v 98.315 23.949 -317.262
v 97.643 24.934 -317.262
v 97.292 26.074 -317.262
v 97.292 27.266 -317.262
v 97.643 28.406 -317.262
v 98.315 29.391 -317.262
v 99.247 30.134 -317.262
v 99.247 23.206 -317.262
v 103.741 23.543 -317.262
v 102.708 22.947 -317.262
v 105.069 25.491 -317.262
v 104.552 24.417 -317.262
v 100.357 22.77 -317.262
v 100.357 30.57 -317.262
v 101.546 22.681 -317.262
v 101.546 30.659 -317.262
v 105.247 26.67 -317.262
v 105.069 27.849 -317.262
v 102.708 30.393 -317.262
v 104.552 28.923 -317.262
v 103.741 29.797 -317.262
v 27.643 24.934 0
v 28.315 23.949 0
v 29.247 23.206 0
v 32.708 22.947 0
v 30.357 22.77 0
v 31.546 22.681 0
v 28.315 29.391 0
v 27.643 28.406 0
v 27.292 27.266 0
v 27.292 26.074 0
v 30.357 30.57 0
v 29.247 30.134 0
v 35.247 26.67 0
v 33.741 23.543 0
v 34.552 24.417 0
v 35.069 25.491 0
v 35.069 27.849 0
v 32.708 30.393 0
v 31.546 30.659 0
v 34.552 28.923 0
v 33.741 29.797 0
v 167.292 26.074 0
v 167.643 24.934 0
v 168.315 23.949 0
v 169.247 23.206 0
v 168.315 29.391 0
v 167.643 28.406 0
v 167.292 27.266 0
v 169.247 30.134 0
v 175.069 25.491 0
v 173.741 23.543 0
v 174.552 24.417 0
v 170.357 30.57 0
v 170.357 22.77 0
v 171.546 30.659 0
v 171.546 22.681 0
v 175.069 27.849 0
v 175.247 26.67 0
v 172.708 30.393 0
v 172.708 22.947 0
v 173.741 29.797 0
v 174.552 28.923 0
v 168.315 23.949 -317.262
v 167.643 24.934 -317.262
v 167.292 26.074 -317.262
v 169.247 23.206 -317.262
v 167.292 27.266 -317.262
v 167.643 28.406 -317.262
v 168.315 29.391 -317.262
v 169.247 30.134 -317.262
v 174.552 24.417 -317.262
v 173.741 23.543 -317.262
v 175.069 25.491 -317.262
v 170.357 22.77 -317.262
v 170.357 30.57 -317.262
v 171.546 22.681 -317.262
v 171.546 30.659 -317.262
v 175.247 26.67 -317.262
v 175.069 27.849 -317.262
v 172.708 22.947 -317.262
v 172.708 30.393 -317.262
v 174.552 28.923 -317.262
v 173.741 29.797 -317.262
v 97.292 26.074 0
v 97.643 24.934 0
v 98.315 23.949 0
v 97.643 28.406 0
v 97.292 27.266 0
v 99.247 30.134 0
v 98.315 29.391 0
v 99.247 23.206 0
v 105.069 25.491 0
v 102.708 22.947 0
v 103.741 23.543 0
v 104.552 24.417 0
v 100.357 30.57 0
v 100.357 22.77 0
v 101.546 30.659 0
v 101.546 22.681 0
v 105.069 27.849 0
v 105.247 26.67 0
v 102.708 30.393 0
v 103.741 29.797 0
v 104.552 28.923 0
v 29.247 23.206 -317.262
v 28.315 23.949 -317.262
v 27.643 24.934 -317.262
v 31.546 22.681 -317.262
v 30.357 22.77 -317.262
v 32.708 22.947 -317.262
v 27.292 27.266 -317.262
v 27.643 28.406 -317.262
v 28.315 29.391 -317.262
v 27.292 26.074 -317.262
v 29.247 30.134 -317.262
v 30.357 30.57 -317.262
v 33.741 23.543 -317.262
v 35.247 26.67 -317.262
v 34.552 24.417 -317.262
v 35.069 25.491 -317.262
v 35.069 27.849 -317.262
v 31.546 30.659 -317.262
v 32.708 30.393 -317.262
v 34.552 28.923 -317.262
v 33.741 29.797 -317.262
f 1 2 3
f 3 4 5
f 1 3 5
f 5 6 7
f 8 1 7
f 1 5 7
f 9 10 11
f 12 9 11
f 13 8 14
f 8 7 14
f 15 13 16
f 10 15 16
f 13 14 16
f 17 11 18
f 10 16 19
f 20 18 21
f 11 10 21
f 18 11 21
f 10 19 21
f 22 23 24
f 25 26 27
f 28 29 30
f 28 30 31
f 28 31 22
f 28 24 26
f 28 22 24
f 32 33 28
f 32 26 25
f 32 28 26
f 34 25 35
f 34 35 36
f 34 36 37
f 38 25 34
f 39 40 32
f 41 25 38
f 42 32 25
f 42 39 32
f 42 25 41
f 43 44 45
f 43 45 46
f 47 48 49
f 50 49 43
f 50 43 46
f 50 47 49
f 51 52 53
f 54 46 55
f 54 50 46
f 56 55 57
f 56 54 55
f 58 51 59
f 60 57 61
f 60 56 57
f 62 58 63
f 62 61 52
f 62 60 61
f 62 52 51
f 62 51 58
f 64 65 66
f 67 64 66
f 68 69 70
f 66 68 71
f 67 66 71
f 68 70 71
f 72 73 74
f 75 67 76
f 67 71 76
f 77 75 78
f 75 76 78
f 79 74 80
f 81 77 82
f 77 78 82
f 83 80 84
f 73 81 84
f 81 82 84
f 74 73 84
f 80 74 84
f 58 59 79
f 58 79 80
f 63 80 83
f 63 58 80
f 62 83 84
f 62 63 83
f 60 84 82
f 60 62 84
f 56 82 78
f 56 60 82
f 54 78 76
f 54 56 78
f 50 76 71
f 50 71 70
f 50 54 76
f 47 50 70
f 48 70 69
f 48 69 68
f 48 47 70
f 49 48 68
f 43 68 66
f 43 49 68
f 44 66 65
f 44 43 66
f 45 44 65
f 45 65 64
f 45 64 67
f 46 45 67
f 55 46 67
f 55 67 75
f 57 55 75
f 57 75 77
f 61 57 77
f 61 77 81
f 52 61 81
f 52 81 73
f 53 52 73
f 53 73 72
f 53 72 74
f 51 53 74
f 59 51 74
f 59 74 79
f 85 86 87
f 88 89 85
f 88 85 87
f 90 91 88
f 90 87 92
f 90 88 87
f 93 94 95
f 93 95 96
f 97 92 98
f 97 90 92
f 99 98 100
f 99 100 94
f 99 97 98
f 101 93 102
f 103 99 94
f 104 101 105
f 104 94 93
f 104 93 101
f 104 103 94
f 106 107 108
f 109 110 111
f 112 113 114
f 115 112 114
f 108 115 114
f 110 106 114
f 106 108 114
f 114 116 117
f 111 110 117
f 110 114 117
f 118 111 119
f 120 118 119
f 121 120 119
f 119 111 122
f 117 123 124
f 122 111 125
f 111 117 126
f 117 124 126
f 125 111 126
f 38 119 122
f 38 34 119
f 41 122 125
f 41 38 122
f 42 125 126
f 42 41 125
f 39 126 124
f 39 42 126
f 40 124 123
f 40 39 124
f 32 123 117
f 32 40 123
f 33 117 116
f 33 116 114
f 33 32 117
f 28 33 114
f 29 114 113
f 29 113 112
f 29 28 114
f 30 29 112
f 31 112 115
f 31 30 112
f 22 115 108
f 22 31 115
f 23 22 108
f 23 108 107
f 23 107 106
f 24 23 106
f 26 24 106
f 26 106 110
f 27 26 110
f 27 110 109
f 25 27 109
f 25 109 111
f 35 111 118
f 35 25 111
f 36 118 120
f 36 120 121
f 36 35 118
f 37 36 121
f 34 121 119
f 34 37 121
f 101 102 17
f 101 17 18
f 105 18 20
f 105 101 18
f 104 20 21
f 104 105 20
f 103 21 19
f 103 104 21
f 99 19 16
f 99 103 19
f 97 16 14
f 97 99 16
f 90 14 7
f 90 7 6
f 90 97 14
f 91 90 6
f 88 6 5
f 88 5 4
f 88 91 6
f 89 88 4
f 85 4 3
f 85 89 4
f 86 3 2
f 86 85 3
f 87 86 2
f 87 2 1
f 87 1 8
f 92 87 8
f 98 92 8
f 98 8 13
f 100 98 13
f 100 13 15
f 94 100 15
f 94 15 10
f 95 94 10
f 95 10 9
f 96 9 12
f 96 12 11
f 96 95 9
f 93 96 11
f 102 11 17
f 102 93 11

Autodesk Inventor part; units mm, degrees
ref_plane "YZ Plane" through (0, 0, 0) normal (1, 0, 0) x (0, 1, 0)
ref_plane "XZ Plane" through (0, 0, 0) normal (0, 1, 0) x (-1, 0, 0)
ref_plane "Work Plane1" through (0, 0, 0) normal (0, 0, 1) x (1, 0, 0)
sketch "Sketch1" plane through (0, 0, 0) normal (0, 0, 1) x (1, 0, 0)
  circle A0 centre (31.2471, 26.67) radius 4 projected
  circle A1 centre (171.2471, 26.67) radius 4 projected
  circle A2 centre (101.2471, 26.67) radius 5 projected
  circle A3 centre (101.2471, 26.67) radius 4
  point P0 (0, 0)
  dimension "d0" = 8
ref_plane "Work Plane2" through (21.2841, 5.08, -317.2625) normal (0, 0, -1) x (0, 1, 0)
extrude "Extrusion1" add sketch "Sketch1" against normal up to surface (317.2625 mm away) contours A0 | A1 | A3
properties part number "YRails"
